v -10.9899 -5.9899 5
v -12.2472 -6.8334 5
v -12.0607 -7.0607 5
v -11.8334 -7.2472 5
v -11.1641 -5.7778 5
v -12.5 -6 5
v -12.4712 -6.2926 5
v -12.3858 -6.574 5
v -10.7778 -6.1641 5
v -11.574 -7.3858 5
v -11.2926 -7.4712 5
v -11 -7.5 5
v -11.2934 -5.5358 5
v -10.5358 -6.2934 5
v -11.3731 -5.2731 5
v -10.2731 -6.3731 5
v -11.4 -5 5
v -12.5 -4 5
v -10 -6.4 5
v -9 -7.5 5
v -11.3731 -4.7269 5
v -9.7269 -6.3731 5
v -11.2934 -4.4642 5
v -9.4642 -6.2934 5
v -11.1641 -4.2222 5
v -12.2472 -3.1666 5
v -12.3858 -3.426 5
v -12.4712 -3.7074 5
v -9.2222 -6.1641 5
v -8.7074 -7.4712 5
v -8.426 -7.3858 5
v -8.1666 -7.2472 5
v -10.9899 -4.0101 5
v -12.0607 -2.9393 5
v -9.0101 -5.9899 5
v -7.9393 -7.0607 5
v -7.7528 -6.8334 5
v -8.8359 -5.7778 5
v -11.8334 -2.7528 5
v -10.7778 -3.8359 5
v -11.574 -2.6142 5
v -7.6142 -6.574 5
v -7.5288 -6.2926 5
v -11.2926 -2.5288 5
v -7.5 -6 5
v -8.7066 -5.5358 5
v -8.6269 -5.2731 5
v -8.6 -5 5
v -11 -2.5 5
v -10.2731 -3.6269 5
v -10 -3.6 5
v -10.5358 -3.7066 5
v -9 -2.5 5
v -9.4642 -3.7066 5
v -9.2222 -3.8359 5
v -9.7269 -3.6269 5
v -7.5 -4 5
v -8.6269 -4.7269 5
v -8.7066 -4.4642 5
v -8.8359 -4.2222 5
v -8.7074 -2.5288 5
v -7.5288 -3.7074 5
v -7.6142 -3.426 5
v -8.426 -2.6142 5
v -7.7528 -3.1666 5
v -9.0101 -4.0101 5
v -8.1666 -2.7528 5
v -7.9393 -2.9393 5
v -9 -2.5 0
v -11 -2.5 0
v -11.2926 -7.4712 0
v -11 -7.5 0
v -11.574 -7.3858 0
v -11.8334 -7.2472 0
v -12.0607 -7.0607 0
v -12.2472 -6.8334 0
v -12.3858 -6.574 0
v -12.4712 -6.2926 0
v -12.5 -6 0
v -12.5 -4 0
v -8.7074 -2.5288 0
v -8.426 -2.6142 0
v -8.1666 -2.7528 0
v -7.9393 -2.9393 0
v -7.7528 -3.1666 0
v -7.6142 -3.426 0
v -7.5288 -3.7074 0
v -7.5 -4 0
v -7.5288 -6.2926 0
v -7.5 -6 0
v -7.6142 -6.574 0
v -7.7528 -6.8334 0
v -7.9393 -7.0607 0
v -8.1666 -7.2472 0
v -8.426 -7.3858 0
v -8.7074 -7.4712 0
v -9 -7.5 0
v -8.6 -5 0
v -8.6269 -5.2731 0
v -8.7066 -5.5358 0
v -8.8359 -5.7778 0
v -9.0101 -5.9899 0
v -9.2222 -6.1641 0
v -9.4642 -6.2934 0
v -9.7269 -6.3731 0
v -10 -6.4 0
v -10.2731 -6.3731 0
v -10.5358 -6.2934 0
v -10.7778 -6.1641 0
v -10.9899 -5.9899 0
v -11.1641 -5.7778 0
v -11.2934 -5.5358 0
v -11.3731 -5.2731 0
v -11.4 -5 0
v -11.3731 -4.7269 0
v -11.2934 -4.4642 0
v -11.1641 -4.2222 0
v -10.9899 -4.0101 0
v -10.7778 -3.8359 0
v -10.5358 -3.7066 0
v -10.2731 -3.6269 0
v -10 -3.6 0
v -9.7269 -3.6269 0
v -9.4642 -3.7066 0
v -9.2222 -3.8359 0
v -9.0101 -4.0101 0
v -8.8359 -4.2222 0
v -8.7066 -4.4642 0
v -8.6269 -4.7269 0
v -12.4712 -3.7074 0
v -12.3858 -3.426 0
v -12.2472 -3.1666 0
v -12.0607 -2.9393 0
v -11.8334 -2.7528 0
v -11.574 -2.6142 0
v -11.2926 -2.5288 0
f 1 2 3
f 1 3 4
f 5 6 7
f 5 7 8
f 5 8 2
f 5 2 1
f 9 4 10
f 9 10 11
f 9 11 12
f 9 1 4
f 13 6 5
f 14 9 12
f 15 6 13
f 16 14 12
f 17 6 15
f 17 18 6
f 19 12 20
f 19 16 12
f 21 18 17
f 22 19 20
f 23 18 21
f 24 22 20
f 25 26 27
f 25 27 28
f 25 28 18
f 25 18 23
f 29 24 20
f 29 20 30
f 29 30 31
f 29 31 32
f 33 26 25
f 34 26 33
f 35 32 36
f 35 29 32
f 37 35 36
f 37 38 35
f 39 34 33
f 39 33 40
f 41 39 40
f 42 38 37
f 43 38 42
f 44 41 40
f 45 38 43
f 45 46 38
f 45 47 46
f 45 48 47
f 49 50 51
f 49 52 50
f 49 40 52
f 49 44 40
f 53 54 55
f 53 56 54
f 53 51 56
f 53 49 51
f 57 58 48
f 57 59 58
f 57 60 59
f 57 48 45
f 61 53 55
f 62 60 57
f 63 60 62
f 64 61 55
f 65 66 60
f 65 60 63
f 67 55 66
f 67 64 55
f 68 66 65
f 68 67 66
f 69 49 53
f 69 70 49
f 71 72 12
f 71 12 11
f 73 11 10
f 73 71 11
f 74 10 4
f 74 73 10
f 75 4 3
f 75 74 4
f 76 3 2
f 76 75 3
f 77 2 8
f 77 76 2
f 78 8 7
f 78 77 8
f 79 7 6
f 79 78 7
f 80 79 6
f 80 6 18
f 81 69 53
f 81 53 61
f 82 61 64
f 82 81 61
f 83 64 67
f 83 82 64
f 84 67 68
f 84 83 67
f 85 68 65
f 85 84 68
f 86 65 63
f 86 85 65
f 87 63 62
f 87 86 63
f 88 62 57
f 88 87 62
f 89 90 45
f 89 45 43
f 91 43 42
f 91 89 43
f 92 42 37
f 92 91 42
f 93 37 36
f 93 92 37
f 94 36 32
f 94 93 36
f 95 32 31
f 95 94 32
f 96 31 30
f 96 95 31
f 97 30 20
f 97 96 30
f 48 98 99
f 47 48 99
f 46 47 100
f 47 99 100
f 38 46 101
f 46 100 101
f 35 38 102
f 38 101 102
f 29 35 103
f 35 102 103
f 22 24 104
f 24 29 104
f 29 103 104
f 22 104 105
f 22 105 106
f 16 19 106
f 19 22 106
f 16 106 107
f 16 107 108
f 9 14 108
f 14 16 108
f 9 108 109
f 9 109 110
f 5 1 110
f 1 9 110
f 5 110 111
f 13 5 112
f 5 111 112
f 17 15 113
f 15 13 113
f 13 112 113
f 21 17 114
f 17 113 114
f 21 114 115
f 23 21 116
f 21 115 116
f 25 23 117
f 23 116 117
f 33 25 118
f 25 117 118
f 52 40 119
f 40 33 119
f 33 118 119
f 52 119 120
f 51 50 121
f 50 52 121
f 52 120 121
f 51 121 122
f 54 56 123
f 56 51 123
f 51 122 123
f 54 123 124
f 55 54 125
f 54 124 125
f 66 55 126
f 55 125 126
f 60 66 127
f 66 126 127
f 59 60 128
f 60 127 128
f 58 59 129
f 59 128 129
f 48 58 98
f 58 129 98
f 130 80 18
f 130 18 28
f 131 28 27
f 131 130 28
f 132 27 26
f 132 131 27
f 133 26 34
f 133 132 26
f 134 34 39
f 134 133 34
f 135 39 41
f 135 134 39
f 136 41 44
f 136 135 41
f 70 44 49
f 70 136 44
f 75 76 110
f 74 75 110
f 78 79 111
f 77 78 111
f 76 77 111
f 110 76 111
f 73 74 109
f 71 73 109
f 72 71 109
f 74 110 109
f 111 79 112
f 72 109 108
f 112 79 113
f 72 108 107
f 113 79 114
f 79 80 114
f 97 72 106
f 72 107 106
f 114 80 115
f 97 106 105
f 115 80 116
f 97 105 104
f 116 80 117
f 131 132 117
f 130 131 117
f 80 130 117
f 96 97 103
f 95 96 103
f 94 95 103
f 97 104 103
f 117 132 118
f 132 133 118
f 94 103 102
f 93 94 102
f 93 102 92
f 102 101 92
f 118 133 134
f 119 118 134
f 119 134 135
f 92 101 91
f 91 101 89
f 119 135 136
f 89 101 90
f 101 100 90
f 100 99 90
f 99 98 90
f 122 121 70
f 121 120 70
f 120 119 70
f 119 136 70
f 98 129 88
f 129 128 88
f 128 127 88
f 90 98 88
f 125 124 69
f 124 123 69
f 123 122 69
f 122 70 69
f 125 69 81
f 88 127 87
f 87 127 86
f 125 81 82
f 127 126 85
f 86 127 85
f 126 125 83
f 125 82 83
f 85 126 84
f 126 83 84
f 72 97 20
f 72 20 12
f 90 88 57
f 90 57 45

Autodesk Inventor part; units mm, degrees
ref_plane "YZ Plane" through (0, 0, 0) normal (1, 0, 0) x (0, 1, 0)
ref_plane "XZ Plane" through (0, 0, 0) normal (0, 1, 0) x (-1, 0, 0)
ref_plane "Plano de trabajo1" through (0, 0, 0) normal (0, 0, 1) x (1, 0, 0)
sketch "Boceto1" plane through (0, 0, 0) normal (0, 0, 1) x (1, 0, 0)
  circle A0 centre (-10, -5) radius 1.5 construction
  line L0 (-11, -2.5) -> (-9, -2.5)
  line L1 (-7.5, -4) -> (-7.5, -6)
  line L2 (-9, -7.5) -> (-11, -7.5)
  line L3 (-12.5, -6) -> (-12.5, -4)
  line L4 (-12.5, -2.5) -> (-7.5, -7.5) construction
  line L5 (-7.5, -2.5) -> (-12.5, -7.5) construction
  arc A1 (-9, -7.5) -> (-7.5, -6) centre (-9, -6) ccw
  arc A2 (-12.5, -6) -> (-11, -7.5) centre (-11, -6) ccw
  arc A3 (-7.5, -4) -> (-9, -2.5) centre (-9, -4) ccw
  arc A4 (-11, -2.5) -> (-12.5, -4) centre (-11, -4) ccw
  circle A5 centre (-10, -5) radius 1.4
  point P0 (0, 0)
  dimension "d0" = 5
  dimension "d1" = 5
  dimension "d2" = 1.5
  dimension "d5" = 0.1
extrude "Extrusión1" add sketch "Boceto1" along normal blind 5
properties part number "ReyenedorTornillo3M"
